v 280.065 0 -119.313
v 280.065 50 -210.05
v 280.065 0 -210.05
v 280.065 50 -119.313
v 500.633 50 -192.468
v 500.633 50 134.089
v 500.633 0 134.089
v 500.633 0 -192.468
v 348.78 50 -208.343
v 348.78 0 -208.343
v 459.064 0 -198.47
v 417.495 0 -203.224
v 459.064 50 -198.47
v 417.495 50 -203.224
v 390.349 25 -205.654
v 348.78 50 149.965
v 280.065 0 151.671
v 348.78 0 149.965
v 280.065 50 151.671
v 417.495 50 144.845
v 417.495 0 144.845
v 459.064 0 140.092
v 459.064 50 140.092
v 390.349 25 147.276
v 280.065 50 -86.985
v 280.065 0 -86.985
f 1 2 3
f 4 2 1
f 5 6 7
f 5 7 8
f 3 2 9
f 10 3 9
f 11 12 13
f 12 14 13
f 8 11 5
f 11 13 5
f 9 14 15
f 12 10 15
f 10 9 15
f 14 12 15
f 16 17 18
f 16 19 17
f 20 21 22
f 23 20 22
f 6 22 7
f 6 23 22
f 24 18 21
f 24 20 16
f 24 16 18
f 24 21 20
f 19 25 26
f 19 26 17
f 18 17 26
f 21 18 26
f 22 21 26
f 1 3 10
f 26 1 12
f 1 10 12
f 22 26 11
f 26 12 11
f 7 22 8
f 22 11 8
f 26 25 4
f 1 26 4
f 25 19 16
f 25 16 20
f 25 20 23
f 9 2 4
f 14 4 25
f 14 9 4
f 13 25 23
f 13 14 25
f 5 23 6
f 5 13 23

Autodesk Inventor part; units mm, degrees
ref_plane "YZ Plane" through (0, 0, 0) normal (1, 0, 0) x (0, 1, 0)
ref_plane "XZ Plane" through (0, 0, 0) normal (0, 1, 0) x (-1, 0, 0)
ref_plane "XY Plane" through (0, 0, 0) normal (0, 0, 1) x (1, 0, 0)
ref_plane "Plano de trabajo1" through (0, 50, 0) normal (0, 1, 0) x (1, 0, 0)
sketch "Boceto2" plane through (0, 50, 0) normal (0, 1, 0) x (1, 0, 0)
  line L0 (500.6332, -134.0891) -> (500.6333, 192.4676)
  line L1 (280.0654, 210.0497) -> (280.0653, -151.6711)
  line L2 (280.0654, 210.0497) -> (390.3494, 210.0497) construction
  line L3 (390.3494, 210.0497) -> (500.6333, 192.4676) construction
  spline S0 degree 2 poles (280.0654, 210.0497) (390.3494, 210.0497) (500.6333, 192.4676) knots 1 1 1 2 2 2
  spline S1 degree 2 poles (280.0653, -151.6711) (390.3493, -151.6711) (500.6332, -134.0891) knots 1 1 1 2 2 2
  line L4 (280.0653, -151.6711) -> (390.3493, -151.6711) construction
  line L5 (390.3493, -151.6711) -> (500.6332, -134.0891) construction
  line L6 (-182.5078, -134.4984) -> (-182.5078, 209.4027) projected
  line L7 (-163.212, -134.4984) -> (-182.5078, -134.4984) projected
  line L8 (-182.5078, 209.4027) -> (-170.0243, 209.4027) projected
  arc A0 (158.2881, -64.7914) -> (141.8037, 119.3131) centre (-117.1057, 3.3405) ccw
  line L9 (280.0654, 86.9847) -> (280.0654, 119.3131)
  arc A1 (166.3277, 13.9754) -> (163.3188, 46.3037) centre (-97.2594, 5.7469) ccw
  point P0 (0, 0)
  point P1 (-85.0735, -155.8983)
  point P2 (120.8954, -149.1961)
  point P3 (0.0587, 221.333)
  point P4 (141.8037, 86.9847)
  point P5 (141.8037, -60.9345)
extrude "Extrusión5" add sketch "Boceto2" against normal blind 50 contours S1 L1 S0 L0
properties part number "Soporte muñeca"
